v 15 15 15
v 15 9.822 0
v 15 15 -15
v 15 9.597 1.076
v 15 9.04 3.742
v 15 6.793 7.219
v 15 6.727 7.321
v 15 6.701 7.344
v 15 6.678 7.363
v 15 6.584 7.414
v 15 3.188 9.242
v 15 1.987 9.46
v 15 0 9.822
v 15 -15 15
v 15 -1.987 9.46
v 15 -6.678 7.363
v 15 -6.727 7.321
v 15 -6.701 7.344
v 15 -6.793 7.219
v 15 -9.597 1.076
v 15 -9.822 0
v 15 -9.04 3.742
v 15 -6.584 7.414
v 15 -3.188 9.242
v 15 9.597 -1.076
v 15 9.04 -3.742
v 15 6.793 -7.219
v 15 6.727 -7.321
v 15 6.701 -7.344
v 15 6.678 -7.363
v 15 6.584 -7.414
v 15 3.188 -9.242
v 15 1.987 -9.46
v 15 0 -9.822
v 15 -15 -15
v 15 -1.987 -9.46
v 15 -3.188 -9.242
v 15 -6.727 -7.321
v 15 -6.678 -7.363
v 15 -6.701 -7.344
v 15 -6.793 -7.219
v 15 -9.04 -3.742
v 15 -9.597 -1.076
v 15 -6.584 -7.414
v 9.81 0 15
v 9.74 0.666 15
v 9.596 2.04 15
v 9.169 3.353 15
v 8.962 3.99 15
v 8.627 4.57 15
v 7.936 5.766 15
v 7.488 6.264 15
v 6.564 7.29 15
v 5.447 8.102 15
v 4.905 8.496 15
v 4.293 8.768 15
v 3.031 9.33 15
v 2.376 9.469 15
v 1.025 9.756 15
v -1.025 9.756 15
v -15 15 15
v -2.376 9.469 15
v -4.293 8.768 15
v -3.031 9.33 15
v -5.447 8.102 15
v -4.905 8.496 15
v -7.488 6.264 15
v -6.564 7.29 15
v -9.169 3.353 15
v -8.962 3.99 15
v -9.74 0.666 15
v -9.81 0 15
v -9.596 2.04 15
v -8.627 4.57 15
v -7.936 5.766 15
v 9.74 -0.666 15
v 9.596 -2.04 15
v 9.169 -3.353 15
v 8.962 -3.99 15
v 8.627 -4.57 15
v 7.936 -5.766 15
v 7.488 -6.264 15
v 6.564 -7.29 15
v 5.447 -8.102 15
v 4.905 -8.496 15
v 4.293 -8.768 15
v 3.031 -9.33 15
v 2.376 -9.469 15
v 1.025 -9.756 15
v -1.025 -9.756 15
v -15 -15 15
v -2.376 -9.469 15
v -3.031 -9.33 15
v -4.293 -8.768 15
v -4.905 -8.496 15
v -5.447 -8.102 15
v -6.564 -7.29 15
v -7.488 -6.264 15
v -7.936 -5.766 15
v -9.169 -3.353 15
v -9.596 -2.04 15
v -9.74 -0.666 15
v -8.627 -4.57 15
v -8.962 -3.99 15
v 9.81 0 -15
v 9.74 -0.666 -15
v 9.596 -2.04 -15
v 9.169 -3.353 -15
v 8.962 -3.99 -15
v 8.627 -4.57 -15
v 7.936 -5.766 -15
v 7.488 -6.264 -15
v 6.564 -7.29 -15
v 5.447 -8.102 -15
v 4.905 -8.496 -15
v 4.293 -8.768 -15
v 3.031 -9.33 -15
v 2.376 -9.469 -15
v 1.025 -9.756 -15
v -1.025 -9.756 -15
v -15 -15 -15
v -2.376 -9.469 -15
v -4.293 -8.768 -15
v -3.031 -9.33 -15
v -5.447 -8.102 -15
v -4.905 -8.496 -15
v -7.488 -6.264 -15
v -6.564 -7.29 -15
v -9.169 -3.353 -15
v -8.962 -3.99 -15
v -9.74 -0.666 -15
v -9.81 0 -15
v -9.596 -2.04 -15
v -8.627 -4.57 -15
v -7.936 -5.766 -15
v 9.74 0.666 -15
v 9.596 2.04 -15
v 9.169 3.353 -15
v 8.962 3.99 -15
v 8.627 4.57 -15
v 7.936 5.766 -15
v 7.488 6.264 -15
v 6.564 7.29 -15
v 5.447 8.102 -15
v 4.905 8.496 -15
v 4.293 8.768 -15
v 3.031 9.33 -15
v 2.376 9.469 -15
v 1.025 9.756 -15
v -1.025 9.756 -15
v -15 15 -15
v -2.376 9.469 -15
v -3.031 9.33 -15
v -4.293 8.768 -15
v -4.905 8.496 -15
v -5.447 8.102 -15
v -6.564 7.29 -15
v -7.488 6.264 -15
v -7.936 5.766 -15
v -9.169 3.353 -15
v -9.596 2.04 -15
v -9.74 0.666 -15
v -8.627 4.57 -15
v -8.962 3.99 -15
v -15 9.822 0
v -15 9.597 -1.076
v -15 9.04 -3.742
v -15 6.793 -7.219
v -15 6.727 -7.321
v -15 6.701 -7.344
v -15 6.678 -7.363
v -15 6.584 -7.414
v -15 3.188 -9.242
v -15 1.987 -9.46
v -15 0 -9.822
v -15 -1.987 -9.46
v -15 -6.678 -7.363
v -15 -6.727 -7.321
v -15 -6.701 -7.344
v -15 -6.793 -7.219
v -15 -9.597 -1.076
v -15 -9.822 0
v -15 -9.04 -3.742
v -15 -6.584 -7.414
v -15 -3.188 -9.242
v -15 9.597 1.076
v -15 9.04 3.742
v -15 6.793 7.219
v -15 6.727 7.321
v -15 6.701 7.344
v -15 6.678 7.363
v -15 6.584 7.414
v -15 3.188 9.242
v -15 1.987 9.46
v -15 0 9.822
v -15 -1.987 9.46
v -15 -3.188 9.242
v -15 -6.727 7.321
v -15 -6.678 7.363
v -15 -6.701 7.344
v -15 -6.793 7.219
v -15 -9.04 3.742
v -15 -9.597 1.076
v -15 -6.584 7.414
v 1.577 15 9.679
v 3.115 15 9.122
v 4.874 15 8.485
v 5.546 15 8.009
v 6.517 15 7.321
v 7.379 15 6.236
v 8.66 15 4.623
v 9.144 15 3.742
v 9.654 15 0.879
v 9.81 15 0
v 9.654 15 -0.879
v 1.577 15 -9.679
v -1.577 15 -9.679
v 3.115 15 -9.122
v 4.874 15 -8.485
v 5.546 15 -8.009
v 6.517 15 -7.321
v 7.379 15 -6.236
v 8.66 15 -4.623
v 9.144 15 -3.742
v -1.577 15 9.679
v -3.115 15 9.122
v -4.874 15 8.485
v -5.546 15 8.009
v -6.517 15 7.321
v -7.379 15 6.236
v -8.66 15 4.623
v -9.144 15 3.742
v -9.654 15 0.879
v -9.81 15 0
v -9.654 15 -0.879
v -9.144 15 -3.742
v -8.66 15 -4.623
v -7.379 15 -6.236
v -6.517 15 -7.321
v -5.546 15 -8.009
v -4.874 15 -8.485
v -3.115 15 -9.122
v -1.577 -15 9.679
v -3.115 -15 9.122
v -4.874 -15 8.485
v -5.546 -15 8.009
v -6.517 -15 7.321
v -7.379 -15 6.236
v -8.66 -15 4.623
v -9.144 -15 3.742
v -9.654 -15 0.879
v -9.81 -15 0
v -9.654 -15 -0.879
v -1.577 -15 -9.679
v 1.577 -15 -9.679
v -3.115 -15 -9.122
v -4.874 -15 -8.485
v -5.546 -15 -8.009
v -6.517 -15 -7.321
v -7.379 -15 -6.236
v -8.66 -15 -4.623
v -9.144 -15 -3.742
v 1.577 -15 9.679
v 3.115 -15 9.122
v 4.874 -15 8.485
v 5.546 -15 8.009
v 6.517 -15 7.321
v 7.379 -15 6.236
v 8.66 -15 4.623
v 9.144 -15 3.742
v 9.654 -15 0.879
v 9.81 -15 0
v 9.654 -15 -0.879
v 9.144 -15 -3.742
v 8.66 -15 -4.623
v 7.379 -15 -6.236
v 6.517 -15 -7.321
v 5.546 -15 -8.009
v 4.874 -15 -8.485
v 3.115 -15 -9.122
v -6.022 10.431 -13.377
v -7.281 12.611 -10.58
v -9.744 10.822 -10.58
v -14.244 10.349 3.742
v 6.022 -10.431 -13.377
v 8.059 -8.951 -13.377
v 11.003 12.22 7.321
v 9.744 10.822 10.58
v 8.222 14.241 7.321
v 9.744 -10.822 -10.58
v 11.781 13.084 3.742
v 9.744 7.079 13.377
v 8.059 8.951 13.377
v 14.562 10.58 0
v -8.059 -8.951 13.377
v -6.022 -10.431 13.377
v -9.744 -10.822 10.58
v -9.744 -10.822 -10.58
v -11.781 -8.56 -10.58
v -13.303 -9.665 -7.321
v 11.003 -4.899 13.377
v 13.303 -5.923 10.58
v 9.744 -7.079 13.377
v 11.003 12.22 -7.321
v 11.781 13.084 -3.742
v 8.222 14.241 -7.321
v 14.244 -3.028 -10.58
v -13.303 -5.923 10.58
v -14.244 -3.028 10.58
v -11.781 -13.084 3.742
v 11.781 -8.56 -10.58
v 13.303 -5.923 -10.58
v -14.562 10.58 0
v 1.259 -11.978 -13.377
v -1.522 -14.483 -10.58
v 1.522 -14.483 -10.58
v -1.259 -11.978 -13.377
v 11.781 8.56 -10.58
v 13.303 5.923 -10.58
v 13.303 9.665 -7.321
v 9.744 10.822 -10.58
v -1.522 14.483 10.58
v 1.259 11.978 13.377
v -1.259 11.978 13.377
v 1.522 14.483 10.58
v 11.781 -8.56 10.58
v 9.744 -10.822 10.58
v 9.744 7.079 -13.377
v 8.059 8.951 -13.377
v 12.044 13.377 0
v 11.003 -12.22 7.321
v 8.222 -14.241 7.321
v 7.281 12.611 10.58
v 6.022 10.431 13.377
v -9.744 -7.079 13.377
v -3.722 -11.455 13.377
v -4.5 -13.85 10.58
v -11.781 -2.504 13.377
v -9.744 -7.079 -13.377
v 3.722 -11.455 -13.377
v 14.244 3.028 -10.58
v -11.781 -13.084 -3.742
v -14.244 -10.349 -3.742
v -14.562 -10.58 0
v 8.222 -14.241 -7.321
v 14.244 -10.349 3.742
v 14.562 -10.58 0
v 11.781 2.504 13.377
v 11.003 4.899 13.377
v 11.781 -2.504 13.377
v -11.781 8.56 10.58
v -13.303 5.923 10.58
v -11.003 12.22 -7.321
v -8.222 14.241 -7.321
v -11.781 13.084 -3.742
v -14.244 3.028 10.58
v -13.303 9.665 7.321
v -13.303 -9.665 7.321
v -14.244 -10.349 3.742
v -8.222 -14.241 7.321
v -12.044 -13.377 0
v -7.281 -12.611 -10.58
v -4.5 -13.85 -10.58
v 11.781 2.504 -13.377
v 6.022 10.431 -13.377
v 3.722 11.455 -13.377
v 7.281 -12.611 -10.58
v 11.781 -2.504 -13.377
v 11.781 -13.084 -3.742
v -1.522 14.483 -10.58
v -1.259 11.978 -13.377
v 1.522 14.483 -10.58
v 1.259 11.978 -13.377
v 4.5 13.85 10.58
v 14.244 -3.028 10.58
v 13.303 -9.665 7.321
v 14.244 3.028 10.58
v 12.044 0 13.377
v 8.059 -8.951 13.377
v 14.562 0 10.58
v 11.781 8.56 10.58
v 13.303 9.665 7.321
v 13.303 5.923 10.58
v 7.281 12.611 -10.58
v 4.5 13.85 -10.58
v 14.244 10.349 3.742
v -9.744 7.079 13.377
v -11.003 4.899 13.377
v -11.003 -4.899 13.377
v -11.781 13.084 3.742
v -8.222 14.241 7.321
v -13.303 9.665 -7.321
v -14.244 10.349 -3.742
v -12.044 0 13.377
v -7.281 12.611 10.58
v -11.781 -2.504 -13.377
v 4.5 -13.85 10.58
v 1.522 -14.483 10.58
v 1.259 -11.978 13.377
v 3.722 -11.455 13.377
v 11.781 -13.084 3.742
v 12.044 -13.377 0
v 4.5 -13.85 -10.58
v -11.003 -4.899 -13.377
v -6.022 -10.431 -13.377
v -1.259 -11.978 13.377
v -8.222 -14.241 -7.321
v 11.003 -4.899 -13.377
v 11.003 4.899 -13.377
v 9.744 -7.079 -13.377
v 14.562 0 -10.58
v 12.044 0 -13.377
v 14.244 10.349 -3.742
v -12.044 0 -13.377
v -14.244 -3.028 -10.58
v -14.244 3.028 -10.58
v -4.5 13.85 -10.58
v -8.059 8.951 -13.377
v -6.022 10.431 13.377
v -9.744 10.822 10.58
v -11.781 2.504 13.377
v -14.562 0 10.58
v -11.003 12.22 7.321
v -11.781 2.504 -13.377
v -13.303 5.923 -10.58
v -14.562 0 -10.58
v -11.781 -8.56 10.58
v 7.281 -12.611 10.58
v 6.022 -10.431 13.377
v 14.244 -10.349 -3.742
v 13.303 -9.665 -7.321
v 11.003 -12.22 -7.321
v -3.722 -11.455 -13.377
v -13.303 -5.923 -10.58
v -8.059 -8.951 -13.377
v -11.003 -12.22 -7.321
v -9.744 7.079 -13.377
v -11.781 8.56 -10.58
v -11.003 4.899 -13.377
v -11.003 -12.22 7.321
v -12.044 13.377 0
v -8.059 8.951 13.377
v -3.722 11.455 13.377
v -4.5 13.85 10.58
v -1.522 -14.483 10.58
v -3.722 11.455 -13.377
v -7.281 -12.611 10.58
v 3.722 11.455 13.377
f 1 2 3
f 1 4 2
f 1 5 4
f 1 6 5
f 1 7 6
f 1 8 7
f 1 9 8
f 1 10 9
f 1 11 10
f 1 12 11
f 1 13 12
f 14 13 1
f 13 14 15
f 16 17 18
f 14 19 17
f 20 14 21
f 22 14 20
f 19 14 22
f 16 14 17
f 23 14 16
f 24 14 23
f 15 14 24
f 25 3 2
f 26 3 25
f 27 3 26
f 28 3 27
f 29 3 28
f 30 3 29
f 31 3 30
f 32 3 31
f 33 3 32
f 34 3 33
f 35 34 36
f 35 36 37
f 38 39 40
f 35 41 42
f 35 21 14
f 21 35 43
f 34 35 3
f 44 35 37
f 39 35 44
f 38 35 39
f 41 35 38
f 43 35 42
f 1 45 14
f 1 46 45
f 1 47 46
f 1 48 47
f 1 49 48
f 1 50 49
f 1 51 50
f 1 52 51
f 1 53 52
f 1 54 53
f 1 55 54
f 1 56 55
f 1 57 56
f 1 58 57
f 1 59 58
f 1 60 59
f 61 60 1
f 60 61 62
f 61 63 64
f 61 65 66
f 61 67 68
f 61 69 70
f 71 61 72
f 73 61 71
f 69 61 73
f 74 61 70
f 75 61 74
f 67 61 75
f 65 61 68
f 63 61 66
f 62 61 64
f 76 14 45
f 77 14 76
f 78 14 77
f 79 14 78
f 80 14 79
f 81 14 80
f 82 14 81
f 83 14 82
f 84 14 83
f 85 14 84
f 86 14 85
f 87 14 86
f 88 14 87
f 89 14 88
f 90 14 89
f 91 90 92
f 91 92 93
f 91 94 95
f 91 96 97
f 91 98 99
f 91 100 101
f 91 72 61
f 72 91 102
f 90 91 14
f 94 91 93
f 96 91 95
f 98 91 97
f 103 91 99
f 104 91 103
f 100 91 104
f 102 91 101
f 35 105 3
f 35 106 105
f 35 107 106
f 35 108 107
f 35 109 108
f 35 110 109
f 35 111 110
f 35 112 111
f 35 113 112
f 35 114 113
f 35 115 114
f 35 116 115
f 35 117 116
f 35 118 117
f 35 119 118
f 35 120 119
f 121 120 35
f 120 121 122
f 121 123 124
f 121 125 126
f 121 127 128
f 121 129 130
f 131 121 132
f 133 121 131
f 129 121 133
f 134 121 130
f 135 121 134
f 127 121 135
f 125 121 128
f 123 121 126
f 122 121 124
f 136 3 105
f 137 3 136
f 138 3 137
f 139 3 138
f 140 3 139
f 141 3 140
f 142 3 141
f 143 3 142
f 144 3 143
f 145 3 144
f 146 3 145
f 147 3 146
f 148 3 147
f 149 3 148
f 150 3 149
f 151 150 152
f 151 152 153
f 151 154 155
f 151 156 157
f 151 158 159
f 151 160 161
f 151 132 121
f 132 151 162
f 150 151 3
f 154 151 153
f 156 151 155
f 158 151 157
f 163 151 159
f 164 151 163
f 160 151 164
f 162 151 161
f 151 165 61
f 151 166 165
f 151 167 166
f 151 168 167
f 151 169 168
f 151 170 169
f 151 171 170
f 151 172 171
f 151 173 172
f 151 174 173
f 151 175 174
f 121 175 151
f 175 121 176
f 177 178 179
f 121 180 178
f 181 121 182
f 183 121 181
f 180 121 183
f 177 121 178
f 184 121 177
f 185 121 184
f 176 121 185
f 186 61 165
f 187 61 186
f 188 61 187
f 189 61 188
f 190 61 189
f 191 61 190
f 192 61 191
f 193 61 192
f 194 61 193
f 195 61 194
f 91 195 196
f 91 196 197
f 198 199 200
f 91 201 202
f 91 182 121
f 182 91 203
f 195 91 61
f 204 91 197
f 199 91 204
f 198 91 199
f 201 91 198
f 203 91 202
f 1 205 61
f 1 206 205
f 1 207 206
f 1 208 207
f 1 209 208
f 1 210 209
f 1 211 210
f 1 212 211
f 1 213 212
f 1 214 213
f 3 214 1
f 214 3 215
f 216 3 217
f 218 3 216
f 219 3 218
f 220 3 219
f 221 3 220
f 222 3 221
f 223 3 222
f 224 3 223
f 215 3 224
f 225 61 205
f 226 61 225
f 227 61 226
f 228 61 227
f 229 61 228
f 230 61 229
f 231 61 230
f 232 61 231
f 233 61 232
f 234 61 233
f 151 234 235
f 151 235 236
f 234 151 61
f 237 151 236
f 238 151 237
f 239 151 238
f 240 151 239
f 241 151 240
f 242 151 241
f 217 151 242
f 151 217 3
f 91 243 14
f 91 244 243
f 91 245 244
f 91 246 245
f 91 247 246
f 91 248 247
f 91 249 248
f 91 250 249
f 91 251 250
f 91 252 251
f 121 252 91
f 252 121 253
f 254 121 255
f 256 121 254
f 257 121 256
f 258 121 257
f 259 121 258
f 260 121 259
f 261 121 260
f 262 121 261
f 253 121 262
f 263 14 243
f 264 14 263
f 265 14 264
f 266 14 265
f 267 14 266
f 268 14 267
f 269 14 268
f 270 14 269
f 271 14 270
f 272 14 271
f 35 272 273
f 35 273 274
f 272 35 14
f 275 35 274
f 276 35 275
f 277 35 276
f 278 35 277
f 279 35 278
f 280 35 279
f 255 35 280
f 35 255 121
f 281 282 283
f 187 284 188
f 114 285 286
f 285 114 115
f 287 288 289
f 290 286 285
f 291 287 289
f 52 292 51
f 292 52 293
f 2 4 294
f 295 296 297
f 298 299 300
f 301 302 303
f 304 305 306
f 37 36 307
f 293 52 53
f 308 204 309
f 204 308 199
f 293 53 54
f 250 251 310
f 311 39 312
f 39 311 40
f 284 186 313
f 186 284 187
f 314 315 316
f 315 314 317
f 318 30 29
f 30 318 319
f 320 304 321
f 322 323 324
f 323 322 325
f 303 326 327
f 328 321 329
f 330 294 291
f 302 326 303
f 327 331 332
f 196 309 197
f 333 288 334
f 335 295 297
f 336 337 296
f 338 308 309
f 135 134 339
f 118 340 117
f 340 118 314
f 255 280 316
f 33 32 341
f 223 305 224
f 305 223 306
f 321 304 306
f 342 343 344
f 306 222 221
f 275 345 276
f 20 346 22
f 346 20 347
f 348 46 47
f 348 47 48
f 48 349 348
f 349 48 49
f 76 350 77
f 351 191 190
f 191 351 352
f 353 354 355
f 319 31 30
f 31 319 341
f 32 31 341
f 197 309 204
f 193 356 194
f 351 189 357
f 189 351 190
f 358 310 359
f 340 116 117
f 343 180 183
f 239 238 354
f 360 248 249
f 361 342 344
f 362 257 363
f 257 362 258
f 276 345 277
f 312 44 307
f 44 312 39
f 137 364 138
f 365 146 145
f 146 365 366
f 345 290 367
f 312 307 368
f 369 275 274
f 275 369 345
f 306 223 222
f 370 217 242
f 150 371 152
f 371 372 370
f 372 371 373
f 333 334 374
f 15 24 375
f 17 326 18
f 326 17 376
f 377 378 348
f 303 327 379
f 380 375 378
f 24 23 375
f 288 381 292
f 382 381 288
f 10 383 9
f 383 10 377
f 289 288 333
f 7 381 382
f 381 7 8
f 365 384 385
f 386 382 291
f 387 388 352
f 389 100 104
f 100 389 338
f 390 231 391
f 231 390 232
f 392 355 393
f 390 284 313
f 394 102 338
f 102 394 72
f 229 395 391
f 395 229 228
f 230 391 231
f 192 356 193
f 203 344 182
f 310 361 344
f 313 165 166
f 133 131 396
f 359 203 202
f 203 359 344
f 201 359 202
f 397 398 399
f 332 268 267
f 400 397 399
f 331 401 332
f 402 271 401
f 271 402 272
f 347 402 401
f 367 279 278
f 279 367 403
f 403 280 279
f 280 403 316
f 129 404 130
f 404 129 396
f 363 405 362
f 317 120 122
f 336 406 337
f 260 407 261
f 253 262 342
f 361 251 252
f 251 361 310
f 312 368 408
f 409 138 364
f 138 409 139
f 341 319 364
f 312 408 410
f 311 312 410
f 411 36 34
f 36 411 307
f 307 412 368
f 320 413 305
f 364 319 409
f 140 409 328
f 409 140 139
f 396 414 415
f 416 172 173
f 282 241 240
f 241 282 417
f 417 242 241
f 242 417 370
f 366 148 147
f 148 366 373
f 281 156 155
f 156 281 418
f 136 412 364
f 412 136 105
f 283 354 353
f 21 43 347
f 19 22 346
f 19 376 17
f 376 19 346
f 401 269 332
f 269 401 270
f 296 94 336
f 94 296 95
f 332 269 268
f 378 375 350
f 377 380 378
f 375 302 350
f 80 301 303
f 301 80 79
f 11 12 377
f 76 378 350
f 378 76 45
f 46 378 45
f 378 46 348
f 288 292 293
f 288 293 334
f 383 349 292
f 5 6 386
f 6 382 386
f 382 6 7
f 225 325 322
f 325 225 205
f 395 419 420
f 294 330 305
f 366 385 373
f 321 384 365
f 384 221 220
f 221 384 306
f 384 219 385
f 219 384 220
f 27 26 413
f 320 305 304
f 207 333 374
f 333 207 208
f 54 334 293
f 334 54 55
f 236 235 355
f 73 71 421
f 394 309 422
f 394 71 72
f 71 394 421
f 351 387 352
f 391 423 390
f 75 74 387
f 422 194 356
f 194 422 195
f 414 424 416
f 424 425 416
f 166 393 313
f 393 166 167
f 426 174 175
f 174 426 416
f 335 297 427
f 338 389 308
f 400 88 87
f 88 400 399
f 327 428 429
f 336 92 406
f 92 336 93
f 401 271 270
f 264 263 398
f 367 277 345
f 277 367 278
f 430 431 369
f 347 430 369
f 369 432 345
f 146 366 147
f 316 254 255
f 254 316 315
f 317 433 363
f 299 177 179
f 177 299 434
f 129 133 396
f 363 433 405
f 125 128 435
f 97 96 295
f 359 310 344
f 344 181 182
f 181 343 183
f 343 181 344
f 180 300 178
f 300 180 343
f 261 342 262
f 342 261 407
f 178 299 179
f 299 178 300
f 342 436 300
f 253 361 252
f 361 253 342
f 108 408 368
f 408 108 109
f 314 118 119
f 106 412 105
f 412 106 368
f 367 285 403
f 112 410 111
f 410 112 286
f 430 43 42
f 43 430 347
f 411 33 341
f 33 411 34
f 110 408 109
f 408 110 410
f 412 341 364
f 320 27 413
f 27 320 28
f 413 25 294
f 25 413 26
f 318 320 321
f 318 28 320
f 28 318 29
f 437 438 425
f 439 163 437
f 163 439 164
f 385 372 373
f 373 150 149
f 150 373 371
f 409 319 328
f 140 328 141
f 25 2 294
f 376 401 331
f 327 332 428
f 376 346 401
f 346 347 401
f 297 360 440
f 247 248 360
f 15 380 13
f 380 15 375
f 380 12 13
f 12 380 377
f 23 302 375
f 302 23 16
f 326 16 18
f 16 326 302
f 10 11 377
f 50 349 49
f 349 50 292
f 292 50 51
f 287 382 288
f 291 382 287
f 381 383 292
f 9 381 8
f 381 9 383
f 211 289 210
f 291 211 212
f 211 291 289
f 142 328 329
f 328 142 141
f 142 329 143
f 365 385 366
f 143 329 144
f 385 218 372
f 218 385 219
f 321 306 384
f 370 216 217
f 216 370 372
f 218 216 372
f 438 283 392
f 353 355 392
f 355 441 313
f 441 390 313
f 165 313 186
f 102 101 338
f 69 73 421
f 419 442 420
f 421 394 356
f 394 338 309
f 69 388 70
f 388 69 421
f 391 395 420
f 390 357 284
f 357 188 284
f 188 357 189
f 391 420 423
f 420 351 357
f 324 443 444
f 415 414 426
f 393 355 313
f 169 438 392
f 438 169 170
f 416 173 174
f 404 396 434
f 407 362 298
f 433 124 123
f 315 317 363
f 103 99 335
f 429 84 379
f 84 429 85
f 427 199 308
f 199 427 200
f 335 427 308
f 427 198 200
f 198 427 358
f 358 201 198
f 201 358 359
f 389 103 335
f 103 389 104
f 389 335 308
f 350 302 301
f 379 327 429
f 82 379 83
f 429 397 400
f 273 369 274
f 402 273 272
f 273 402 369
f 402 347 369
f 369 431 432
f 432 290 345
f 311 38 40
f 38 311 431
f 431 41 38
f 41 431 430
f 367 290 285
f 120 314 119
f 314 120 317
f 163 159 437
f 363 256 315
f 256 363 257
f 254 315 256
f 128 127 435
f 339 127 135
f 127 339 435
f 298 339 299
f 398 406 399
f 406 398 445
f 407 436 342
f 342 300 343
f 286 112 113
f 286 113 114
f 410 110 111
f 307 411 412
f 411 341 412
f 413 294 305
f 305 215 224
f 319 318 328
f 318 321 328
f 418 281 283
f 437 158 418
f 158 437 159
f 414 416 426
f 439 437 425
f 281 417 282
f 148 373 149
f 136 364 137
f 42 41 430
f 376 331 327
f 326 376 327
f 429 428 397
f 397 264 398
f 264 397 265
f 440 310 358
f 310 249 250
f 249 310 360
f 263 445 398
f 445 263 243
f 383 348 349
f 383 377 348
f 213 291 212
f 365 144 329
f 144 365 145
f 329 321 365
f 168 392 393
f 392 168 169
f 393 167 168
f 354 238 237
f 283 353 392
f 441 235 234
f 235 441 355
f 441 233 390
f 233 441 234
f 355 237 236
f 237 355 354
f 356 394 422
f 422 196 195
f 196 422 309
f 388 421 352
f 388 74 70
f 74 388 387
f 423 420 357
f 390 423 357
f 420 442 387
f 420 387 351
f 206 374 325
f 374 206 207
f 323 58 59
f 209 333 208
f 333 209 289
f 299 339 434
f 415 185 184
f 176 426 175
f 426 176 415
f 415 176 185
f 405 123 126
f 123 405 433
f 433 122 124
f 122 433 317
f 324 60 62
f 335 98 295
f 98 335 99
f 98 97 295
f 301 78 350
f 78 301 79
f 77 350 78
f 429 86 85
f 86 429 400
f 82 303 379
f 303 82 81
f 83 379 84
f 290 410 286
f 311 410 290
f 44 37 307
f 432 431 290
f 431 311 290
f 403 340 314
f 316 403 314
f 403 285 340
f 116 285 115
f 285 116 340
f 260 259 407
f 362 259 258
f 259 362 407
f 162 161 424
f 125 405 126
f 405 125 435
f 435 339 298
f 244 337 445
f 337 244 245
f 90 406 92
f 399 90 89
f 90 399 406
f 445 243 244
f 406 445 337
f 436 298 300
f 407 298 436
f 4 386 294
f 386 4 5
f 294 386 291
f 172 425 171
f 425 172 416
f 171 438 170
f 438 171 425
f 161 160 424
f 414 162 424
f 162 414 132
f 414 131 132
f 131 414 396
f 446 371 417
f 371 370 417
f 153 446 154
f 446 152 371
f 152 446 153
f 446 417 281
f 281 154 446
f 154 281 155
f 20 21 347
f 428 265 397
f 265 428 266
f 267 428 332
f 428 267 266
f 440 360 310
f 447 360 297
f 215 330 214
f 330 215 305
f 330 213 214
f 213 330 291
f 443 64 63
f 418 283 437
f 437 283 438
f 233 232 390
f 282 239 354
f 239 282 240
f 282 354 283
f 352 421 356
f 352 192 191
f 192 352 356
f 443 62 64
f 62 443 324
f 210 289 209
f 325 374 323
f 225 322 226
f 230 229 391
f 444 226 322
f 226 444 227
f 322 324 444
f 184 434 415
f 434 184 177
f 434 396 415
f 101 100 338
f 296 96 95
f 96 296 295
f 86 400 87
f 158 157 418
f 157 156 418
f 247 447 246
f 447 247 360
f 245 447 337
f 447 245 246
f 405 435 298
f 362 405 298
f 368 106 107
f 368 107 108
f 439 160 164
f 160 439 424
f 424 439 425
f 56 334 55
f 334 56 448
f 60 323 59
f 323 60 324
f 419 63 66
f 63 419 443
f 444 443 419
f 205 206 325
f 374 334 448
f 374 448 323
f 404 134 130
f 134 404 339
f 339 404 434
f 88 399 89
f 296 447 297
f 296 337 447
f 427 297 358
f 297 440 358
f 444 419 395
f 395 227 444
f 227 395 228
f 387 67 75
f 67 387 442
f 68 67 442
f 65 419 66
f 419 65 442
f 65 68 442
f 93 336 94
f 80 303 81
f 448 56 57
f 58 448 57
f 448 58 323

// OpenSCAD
//3D Shapes- Penny Trap

difference(){
    cube(30, center = true);
    sphere(18, center = true);
}
